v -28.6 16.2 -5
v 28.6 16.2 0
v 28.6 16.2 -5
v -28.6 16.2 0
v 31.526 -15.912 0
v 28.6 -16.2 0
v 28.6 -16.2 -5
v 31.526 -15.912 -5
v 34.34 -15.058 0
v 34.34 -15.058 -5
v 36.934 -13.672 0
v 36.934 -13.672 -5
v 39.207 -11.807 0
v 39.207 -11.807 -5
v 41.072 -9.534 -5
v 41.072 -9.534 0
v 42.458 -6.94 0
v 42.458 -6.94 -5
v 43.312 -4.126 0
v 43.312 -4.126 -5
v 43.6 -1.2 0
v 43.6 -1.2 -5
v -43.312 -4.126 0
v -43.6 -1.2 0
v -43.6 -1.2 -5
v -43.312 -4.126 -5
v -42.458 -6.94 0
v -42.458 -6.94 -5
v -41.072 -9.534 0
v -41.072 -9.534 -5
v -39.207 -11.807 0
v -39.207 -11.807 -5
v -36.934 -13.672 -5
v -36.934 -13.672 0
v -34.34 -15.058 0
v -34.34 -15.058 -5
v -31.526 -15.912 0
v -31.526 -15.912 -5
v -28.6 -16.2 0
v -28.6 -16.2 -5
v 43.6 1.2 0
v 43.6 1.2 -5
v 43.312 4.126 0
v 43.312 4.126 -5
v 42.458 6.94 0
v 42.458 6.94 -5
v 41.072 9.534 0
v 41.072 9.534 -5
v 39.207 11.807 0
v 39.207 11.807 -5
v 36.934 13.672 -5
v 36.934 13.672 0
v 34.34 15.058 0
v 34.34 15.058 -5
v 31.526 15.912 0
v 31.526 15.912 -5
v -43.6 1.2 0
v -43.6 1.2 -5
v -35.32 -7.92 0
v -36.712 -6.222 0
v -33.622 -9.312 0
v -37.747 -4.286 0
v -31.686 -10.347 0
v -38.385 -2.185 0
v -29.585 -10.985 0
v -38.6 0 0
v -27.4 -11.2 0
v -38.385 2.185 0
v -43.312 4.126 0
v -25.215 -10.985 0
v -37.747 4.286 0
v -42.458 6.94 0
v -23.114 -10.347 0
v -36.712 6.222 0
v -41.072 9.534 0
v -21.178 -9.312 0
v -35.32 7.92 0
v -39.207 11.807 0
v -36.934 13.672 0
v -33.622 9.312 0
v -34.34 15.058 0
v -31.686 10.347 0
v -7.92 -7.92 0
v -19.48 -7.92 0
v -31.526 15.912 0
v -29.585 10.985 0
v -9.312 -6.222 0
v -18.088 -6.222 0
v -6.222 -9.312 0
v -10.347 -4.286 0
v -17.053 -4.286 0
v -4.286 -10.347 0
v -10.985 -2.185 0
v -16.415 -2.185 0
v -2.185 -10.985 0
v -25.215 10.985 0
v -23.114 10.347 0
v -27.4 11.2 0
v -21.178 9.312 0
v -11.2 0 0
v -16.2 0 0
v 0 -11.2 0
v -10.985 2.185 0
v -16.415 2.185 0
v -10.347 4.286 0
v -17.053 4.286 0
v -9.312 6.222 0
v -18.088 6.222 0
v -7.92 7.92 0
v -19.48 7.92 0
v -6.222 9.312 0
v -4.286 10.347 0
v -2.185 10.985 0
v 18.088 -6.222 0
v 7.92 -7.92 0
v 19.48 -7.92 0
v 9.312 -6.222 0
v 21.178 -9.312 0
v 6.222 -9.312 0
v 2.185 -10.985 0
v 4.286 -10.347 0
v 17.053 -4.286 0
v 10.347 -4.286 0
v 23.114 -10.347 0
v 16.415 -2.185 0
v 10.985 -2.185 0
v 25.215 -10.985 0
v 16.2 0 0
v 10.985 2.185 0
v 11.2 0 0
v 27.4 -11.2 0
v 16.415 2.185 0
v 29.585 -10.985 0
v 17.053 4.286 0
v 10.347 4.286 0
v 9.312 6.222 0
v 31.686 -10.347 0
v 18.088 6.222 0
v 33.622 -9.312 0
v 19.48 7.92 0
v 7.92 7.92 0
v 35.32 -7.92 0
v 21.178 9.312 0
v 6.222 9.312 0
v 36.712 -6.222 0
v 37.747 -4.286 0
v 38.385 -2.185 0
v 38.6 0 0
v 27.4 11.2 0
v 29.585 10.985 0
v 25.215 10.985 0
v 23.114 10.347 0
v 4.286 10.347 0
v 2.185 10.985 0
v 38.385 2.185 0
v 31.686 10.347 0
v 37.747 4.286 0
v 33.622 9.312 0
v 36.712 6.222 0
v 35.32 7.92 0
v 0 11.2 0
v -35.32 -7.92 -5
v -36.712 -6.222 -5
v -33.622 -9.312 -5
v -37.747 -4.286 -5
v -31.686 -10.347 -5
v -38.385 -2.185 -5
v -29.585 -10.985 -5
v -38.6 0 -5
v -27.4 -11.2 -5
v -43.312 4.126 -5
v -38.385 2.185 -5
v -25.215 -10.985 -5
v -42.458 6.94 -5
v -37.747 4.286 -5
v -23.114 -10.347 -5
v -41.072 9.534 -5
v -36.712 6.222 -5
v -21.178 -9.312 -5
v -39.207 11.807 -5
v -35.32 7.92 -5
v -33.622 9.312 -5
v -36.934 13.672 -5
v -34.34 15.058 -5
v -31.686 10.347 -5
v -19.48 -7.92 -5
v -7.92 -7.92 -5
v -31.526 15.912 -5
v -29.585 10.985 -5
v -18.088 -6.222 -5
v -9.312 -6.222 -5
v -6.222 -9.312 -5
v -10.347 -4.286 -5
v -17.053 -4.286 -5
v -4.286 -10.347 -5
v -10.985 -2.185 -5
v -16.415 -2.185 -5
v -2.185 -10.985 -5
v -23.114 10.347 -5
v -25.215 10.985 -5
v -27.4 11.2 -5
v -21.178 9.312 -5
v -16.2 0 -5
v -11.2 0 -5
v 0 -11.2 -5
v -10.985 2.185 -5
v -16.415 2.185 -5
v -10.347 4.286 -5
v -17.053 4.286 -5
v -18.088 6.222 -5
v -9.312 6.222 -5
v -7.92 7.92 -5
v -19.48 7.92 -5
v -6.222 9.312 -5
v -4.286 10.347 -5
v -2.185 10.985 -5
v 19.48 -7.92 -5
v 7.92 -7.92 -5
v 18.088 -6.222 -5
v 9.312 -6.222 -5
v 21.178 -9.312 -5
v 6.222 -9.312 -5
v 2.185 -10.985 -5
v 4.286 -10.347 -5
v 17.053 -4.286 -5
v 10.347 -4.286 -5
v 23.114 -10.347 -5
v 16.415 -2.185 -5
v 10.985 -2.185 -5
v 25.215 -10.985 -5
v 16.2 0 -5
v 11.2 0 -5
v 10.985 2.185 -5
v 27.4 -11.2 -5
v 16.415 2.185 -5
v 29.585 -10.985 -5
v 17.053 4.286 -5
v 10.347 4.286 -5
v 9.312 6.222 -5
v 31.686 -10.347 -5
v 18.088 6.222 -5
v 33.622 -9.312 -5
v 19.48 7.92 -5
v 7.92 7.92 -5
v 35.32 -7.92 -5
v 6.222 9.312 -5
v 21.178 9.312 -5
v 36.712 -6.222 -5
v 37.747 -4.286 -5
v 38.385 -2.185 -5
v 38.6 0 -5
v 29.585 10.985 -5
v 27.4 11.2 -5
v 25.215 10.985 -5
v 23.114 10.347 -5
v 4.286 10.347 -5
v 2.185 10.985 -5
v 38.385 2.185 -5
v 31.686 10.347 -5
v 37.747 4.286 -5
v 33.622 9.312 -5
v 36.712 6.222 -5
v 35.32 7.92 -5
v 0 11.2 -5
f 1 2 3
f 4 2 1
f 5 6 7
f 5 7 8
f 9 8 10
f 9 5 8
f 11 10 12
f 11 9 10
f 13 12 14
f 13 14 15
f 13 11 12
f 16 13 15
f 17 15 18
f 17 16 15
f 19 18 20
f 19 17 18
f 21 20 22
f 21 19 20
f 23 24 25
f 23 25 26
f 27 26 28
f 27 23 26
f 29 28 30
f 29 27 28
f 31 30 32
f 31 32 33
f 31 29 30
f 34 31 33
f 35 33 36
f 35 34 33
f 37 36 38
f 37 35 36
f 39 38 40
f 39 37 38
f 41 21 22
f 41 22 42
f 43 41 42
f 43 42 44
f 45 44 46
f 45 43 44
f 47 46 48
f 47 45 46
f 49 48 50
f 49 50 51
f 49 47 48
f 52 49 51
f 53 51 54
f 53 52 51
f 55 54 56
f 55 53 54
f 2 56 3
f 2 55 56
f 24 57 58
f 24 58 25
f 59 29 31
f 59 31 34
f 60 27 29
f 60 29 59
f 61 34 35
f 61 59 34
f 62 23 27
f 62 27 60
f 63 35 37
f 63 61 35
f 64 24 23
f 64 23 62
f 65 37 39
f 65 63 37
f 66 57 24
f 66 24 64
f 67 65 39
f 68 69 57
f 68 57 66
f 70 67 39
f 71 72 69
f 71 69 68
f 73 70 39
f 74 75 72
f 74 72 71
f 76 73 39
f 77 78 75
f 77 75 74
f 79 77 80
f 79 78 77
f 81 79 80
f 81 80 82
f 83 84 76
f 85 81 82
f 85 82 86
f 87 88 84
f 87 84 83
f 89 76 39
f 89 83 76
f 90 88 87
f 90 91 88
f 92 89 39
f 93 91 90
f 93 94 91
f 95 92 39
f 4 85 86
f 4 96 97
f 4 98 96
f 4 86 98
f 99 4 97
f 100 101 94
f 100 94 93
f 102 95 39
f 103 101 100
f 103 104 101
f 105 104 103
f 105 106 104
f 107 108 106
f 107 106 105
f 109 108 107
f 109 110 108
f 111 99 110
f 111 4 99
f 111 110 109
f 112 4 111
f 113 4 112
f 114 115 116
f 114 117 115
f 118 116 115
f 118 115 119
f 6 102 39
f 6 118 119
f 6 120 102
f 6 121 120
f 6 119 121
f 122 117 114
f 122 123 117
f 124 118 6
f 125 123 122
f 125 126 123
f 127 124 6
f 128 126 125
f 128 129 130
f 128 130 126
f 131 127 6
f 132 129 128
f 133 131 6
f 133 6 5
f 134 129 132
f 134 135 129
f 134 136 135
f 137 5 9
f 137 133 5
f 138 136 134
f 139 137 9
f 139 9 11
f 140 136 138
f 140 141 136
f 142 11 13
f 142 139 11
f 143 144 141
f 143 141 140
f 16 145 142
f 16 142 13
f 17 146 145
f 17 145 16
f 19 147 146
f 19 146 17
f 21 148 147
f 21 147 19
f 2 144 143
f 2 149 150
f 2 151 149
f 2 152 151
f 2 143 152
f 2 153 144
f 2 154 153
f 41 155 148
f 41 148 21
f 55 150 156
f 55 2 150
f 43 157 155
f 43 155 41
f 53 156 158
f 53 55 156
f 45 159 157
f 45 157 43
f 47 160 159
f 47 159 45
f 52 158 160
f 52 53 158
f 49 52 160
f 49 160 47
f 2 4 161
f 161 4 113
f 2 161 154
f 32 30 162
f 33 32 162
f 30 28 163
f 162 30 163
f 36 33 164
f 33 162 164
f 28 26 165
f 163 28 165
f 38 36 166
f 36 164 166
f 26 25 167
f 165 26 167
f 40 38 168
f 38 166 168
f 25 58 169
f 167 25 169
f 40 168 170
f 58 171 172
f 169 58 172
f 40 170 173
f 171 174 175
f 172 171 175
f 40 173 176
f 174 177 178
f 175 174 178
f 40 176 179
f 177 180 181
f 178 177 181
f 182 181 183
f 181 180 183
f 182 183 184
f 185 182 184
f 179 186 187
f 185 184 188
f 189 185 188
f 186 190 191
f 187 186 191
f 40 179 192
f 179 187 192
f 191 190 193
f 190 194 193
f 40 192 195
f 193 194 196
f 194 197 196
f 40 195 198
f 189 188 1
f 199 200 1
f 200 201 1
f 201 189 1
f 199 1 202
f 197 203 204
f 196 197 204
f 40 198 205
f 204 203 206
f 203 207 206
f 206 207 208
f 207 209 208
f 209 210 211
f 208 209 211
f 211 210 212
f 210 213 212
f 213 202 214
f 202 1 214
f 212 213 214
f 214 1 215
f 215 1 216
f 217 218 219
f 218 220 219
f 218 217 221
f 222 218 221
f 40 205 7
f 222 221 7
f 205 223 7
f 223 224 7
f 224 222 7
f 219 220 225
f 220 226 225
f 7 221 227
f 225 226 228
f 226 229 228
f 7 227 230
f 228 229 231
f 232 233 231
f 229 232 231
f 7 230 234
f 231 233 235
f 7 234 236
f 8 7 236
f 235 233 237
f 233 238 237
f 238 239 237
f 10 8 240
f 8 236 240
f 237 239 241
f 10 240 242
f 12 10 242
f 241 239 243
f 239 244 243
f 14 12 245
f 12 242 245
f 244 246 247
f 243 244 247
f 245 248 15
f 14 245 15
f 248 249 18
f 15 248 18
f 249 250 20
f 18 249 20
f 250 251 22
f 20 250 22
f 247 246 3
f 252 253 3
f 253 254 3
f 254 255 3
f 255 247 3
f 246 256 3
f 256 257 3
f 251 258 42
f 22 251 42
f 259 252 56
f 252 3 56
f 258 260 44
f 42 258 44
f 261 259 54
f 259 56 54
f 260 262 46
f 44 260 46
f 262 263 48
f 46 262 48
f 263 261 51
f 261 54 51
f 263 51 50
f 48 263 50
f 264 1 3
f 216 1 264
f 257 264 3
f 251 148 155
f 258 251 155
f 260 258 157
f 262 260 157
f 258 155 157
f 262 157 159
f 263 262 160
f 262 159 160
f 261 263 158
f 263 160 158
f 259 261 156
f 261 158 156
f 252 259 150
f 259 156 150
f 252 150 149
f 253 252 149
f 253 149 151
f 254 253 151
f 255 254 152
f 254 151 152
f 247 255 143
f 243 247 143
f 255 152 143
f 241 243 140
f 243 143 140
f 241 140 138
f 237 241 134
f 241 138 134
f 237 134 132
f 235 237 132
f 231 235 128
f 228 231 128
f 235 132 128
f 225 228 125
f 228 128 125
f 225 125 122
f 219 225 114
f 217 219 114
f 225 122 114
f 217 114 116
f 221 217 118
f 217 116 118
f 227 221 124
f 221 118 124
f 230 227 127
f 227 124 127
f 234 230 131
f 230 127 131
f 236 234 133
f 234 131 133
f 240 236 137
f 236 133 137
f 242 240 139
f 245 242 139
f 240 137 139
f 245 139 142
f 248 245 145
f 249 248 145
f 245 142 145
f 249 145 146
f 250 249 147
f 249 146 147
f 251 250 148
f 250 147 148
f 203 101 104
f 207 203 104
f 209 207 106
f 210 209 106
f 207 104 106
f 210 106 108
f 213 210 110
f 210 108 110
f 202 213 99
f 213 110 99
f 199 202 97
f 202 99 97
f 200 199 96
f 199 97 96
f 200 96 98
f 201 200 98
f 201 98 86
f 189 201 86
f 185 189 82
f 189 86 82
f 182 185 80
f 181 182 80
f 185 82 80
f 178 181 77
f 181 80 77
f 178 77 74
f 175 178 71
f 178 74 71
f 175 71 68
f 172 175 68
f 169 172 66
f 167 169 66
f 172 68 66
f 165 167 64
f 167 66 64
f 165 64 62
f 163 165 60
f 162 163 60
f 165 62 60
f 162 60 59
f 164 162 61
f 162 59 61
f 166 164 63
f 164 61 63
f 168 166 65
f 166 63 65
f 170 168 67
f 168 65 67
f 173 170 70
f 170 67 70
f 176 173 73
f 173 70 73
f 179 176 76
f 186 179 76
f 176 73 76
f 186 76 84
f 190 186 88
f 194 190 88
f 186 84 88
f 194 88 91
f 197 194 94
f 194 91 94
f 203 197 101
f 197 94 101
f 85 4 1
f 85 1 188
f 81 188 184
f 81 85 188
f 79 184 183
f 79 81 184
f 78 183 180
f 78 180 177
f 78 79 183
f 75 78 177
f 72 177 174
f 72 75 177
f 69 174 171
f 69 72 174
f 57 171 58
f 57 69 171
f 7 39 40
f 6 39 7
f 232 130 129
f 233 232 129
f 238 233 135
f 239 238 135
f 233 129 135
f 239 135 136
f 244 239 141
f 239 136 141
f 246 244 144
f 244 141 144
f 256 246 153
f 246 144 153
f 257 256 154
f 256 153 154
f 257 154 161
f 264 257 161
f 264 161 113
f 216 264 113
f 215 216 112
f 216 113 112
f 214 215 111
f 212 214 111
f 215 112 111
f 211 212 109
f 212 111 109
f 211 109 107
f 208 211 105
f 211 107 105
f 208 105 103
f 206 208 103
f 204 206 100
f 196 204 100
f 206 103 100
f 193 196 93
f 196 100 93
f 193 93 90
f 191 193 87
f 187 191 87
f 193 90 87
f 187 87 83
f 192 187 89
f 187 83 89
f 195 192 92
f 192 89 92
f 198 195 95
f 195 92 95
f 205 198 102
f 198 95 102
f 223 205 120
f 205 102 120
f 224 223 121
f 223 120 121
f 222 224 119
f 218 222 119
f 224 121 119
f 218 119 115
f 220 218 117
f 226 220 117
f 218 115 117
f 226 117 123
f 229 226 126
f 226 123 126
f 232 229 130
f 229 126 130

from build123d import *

# Parameters (mm, degrees)
F0_R     = 11.2
F1_DEPTH = 5


with BuildPart() as f1:
    # F0 (on Top) → F1 (new body)
    with BuildSketch(Plane.XY):
        with BuildLine():
            Line((28.6, 16.2), (-28.6, 16.2))
            ThreePointArc((-28.6, 16.2), (-39.206602, 11.806602), (-43.6, 1.2))
            Line((-43.6, 1.2), (-43.6, -1.2))
            ThreePointArc((-43.6, -1.2), (-39.206602, -11.806602), (-28.6, -16.2))
            Line((-28.6, -16.2), (28.6, -16.2))
            ThreePointArc((28.6, -16.2), (39.206602, -11.806602), (43.6, -1.2))
            Line((43.6, -1.2), (43.6, 1.2))
            ThreePointArc((43.6, 1.2), (39.206602, 11.806602), (28.6, 16.2))
        make_face()
        with Locations((-27.4, 0)):
            Circle(F0_R, mode=Mode.SUBTRACT)
        Circle(F0_R, mode=Mode.SUBTRACT)
        with Locations((27.4, 0)):
            Circle(F0_R, mode=Mode.SUBTRACT)
    extrude(amount=-F1_DEPTH)


solid = f1.part
